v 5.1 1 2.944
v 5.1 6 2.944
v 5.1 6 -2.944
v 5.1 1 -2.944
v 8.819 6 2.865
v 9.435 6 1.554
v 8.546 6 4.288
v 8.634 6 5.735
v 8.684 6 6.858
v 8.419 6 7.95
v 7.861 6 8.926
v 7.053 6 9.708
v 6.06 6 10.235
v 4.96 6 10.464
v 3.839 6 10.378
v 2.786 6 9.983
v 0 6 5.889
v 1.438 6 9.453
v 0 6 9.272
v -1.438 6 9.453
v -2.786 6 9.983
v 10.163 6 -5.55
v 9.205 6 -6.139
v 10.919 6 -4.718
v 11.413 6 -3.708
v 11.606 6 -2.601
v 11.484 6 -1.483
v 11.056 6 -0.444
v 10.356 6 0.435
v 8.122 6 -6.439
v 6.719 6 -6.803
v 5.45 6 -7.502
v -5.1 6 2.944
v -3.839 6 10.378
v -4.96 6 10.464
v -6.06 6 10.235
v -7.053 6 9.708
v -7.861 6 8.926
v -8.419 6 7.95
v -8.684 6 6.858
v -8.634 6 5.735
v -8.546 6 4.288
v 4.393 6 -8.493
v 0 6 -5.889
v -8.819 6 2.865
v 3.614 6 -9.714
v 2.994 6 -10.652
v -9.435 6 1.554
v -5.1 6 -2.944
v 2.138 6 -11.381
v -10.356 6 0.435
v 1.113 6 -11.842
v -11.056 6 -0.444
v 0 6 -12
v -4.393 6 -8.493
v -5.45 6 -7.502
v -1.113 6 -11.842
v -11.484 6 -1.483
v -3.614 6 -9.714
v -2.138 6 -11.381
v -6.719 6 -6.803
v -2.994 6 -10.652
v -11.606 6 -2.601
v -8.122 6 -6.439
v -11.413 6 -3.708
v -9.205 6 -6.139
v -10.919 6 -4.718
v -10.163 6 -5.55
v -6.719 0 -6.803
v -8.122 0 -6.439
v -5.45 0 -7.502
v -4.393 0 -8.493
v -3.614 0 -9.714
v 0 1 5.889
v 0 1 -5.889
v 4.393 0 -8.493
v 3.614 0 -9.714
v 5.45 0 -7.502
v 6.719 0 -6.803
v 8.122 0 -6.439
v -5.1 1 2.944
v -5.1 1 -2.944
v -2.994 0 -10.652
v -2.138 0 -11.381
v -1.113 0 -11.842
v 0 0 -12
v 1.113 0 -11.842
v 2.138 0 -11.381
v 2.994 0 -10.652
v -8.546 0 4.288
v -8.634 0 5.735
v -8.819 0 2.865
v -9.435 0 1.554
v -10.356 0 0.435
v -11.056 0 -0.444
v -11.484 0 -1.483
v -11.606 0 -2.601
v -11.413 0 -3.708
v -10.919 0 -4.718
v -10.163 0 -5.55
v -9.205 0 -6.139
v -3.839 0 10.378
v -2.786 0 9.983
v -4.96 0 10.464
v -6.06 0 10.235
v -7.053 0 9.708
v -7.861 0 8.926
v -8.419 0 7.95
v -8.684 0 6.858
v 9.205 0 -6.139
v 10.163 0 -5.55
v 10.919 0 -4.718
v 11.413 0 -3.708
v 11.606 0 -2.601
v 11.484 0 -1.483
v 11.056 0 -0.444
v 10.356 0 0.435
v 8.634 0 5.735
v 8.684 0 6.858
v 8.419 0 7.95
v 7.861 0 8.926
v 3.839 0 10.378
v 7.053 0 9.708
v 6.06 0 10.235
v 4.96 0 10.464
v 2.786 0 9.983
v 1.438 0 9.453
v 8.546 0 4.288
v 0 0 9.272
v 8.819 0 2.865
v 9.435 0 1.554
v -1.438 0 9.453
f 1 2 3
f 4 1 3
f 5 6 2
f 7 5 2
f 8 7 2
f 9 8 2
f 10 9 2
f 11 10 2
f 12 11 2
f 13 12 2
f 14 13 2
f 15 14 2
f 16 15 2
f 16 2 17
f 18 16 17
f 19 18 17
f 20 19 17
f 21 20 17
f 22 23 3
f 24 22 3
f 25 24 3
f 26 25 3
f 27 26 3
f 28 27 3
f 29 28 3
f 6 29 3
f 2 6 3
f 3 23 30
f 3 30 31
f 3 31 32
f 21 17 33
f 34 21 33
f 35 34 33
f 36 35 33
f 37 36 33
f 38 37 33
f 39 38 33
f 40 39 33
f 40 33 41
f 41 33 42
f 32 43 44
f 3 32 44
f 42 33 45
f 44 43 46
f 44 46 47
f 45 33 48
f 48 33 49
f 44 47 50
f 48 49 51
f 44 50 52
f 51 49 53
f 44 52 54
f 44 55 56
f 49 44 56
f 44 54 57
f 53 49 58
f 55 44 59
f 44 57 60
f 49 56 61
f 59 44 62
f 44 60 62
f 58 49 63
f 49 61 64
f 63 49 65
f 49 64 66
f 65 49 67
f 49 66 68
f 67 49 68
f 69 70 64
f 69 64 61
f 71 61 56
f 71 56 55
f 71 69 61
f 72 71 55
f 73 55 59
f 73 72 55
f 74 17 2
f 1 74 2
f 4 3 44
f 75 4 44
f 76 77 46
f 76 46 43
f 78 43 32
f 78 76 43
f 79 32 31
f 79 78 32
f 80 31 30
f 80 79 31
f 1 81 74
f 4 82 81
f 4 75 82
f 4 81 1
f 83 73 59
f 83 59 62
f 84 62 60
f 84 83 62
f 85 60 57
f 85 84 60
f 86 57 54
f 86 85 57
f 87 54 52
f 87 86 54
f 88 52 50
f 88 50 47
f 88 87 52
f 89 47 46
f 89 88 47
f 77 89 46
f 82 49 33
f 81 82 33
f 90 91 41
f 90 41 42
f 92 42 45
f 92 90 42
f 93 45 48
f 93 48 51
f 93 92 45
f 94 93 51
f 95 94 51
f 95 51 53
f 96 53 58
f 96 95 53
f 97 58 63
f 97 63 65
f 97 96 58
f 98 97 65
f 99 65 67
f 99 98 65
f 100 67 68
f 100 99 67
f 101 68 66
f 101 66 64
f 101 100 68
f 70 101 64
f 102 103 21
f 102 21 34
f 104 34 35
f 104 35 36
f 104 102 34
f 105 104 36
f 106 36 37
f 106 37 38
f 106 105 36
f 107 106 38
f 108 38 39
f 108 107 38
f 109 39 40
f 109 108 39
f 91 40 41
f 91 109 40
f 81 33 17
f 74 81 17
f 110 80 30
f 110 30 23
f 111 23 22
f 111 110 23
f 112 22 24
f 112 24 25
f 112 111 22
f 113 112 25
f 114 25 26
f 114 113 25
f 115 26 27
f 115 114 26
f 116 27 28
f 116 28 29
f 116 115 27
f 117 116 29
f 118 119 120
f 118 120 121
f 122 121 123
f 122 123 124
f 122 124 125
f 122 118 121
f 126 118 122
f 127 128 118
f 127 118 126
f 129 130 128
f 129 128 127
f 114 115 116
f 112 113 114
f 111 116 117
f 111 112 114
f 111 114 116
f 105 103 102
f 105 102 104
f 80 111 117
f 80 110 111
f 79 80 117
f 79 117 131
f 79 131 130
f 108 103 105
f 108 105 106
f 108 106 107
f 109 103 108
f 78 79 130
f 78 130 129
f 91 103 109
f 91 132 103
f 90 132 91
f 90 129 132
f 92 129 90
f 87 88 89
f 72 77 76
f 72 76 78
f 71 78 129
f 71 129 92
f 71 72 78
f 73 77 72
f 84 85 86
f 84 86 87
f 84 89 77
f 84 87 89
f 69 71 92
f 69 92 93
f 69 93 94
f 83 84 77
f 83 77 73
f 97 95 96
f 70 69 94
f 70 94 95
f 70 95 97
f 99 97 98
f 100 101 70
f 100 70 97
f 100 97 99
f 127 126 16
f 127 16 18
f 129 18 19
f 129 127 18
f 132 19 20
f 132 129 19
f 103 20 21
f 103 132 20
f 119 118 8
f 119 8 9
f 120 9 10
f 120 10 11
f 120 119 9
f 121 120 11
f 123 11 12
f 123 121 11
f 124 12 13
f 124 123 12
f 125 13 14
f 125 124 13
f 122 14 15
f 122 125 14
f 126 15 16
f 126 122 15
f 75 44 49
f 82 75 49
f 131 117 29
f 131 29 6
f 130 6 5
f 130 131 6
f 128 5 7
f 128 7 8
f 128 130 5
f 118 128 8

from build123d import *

# Parameters (mm, degrees)
BOSS_EXTRUDE1_DEPTH = 6
CUT_EXTRUDE1_DEPTH  = 5


with BuildPart() as part:
    # Sketch1 → Boss-Extrude1 (new body)
    with BuildSketch(Plane(origin=(0, 0, 0), x_dir=(1, 0, 0), z_dir=(0, 1, 0))):
        with BuildLine():
            ThreePointArc((-3.614057951, 9.714230186), (0, 12), (3.614057951, 9.714230186))
            ThreePointArc((3.614057951, 9.714230186), (5.450234482, 7.501604203), (8.121976593, 6.439035579))
            ThreePointArc((8.121976593, 6.439035579), (11.412678196, 3.708203932), (10.355587244, -0.43531115))
            ThreePointArc((10.355587244, -0.43531115), (8.818664639, -2.865357836), (8.633715541, -5.734687343))
            ThreePointArc((8.633715541, -5.734687343), (7.053423028, -9.708203932), (2.78604694, -9.983267272))
            ThreePointArc((2.78604694, -9.983267272), (0, -9.272492736), (-2.78604694, -9.983267272))
            ThreePointArc((-2.78604694, -9.983267272), (-7.053423028, -9.708203932), (-8.633715541, -5.734687343))
            ThreePointArc((-8.633715541, -5.734687343), (-8.818664639, -2.865357836), (-10.355587244, -0.43531115))
            ThreePointArc((-10.355587244, -0.43531115), (-11.412678196, 3.708203932), (-8.121976593, 6.439035579))
            ThreePointArc((-8.121976593, 6.439035579), (-5.450234482, 7.501604203), (-3.614057951, 9.714230186))
        make_face()
    extrude(amount=BOSS_EXTRUDE1_DEPTH)

    # Sketch2 → Cut-Extrude1 (cut)
    with BuildSketch(Plane(origin=(0, 6, 0), x_dir=(1, 0, 0), z_dir=(0, 1, 0))):
        Polygon((-5.1, 2.944486373), (-5.1, -2.944486373), (0, -5.888972746), (5.1, -2.944486373), (5.1, 2.944486373), (0, 5.888972746), align=None)
    extrude(amount=-CUT_EXTRUDE1_DEPTH, mode=Mode.SUBTRACT)


solid = part.part
